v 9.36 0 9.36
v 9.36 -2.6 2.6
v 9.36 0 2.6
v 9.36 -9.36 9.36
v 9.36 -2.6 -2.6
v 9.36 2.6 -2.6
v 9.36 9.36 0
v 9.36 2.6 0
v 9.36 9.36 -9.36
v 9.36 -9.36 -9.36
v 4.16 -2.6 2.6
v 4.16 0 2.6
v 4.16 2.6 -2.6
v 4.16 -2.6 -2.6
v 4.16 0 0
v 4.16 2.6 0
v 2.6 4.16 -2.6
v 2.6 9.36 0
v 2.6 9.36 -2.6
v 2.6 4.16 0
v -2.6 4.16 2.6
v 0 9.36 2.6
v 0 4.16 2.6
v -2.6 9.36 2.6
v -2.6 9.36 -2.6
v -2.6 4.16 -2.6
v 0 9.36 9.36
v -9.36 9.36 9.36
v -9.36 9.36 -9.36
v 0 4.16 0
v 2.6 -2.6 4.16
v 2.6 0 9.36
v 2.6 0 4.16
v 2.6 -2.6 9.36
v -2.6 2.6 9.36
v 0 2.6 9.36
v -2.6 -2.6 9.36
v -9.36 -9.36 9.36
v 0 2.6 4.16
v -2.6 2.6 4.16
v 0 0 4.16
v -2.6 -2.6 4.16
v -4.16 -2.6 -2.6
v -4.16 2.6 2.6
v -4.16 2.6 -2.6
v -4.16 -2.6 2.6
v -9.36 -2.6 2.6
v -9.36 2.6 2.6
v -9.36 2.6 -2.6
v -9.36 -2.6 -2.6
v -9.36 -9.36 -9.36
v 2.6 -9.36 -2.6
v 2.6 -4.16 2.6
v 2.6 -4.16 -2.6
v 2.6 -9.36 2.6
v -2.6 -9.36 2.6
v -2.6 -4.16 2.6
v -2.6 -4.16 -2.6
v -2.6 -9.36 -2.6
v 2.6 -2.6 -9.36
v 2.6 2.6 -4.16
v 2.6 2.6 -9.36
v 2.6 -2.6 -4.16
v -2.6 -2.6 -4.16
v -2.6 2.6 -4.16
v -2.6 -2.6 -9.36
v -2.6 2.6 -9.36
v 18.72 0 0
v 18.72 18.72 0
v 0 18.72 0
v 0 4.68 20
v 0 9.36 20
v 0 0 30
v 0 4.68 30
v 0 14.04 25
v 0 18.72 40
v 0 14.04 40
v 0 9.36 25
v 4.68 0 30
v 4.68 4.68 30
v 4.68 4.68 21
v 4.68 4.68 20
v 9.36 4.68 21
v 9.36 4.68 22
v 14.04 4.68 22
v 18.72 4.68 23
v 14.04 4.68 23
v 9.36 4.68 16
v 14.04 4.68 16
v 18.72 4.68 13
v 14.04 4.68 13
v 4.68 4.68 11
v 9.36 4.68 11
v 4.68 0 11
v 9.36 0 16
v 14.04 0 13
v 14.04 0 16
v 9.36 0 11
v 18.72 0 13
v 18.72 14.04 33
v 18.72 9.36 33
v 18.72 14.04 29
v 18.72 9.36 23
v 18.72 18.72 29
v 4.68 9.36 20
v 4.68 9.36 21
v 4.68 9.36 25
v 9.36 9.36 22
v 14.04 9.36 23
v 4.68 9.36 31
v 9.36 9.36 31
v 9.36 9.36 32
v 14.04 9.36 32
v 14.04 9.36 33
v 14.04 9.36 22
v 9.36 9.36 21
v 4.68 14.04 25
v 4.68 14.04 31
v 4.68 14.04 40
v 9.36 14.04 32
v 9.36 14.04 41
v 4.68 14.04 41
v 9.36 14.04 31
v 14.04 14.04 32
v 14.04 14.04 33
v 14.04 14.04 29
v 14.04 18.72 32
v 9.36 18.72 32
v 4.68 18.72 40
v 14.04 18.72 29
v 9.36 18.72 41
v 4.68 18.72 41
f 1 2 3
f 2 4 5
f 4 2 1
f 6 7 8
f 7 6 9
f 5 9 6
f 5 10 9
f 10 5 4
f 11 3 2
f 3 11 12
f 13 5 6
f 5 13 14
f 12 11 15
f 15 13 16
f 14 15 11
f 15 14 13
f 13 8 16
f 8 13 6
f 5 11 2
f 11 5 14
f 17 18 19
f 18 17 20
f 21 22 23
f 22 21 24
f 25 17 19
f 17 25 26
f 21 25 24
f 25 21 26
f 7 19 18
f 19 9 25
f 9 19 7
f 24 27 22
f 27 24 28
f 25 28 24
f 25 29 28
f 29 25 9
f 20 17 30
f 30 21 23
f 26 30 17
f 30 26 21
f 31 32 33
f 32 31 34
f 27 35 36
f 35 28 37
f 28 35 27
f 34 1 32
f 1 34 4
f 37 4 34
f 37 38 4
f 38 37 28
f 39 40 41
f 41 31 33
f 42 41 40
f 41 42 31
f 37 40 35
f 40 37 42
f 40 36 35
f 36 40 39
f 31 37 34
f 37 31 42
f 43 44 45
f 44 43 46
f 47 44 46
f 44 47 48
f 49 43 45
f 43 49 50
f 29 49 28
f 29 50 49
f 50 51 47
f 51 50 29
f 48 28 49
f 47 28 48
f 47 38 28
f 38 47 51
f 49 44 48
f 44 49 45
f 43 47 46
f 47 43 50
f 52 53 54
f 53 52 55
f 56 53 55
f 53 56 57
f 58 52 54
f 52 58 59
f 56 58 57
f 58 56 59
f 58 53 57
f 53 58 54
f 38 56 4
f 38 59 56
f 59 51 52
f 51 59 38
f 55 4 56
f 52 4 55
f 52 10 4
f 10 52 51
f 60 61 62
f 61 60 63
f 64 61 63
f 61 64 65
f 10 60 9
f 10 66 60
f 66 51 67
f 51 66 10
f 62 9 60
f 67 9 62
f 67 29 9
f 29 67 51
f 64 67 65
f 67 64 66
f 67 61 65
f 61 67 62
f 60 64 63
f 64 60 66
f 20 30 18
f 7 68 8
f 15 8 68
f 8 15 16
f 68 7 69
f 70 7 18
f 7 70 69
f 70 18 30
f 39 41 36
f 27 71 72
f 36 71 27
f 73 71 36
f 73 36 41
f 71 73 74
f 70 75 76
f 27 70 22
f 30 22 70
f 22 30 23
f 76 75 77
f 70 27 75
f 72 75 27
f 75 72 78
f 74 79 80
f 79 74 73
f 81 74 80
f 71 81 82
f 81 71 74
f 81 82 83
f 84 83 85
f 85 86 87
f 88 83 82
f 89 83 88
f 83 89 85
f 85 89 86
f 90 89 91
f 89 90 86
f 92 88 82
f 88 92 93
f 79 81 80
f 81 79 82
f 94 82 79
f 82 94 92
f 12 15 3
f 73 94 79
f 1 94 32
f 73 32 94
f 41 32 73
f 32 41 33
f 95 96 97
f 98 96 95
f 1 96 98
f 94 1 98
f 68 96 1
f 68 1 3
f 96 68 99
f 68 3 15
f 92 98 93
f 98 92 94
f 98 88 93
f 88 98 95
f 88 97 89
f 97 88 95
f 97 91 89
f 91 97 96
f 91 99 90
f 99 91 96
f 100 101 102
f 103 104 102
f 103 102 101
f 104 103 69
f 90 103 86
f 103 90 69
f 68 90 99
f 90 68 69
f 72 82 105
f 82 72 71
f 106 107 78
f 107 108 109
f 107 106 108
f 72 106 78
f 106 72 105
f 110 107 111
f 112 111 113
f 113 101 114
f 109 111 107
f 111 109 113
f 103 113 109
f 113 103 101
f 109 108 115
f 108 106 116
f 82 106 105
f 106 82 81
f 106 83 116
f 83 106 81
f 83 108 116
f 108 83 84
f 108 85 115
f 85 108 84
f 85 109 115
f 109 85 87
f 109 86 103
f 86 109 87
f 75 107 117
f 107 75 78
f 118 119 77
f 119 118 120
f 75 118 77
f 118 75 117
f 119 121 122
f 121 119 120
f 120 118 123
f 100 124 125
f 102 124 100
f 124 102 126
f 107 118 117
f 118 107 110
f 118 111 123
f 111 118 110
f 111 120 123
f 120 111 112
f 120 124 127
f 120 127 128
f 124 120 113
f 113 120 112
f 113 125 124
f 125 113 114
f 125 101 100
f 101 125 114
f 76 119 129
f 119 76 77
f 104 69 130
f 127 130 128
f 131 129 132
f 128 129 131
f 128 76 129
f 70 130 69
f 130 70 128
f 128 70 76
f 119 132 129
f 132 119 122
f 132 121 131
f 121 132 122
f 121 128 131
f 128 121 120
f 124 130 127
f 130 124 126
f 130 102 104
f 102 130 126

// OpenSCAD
/* MineCraft Blocks */


/* [Dimensions] */
wallThck=0.4;
blockSize=20;
layerThck=0.16;
decorLayers=4;
magnetDia=5;
magSpcng=0.1;
//pixels per face (squared)
pxCount=4; 

/* [show] */
showCore=true;

/* [Hidden] */
coreSize=blockSize-2*layerThck*decorLayers;
coreDims=[coreSize,coreSize,coreSize];
diffDist=(coreSize-magnetDia)/2-magSpcng;
pxSize=coreSize/pxCount;
fudge=0.1;

//displacement values
defaultMap=[
  [30,11,16,13],
  [20,21,22,23],
  [25,31,32,33],
  [40,41,32,29] 
  ];

//cube on the tip
*translate([0,0,cubeORad(blockSize)]) 
  rotate([45,35,60]) 
    core();

if (showCore)
  core();

module core(){
  difference(){
    cube(coreSize,true);
    for (dir=[[1,0,0],[0,1,0],[0,0,1],[-1,0,0],[0,-1,0],[0,0,-1]])
      translate([dir.x*diffDist,dir.y*diffDist,dir.z*diffDist]) cube(magnetDia+magSpcng*2,true);
  }
}


scale([1,1,1]) decor();

module decor(map=defaultMap){
  echo(str("LenMap: ",len(map)));
  for (iy=[0:len(map)-1])
    for (ix=[0:len(map[iy])-1]){
      echo(ix,iy);
      translate([ix*pxSize,iy*pxSize]) linear_extrude(map[iy][ix]) square(pxSize);
    }
}

function cubeORad(size=10)=size/2*sqrt(3);
